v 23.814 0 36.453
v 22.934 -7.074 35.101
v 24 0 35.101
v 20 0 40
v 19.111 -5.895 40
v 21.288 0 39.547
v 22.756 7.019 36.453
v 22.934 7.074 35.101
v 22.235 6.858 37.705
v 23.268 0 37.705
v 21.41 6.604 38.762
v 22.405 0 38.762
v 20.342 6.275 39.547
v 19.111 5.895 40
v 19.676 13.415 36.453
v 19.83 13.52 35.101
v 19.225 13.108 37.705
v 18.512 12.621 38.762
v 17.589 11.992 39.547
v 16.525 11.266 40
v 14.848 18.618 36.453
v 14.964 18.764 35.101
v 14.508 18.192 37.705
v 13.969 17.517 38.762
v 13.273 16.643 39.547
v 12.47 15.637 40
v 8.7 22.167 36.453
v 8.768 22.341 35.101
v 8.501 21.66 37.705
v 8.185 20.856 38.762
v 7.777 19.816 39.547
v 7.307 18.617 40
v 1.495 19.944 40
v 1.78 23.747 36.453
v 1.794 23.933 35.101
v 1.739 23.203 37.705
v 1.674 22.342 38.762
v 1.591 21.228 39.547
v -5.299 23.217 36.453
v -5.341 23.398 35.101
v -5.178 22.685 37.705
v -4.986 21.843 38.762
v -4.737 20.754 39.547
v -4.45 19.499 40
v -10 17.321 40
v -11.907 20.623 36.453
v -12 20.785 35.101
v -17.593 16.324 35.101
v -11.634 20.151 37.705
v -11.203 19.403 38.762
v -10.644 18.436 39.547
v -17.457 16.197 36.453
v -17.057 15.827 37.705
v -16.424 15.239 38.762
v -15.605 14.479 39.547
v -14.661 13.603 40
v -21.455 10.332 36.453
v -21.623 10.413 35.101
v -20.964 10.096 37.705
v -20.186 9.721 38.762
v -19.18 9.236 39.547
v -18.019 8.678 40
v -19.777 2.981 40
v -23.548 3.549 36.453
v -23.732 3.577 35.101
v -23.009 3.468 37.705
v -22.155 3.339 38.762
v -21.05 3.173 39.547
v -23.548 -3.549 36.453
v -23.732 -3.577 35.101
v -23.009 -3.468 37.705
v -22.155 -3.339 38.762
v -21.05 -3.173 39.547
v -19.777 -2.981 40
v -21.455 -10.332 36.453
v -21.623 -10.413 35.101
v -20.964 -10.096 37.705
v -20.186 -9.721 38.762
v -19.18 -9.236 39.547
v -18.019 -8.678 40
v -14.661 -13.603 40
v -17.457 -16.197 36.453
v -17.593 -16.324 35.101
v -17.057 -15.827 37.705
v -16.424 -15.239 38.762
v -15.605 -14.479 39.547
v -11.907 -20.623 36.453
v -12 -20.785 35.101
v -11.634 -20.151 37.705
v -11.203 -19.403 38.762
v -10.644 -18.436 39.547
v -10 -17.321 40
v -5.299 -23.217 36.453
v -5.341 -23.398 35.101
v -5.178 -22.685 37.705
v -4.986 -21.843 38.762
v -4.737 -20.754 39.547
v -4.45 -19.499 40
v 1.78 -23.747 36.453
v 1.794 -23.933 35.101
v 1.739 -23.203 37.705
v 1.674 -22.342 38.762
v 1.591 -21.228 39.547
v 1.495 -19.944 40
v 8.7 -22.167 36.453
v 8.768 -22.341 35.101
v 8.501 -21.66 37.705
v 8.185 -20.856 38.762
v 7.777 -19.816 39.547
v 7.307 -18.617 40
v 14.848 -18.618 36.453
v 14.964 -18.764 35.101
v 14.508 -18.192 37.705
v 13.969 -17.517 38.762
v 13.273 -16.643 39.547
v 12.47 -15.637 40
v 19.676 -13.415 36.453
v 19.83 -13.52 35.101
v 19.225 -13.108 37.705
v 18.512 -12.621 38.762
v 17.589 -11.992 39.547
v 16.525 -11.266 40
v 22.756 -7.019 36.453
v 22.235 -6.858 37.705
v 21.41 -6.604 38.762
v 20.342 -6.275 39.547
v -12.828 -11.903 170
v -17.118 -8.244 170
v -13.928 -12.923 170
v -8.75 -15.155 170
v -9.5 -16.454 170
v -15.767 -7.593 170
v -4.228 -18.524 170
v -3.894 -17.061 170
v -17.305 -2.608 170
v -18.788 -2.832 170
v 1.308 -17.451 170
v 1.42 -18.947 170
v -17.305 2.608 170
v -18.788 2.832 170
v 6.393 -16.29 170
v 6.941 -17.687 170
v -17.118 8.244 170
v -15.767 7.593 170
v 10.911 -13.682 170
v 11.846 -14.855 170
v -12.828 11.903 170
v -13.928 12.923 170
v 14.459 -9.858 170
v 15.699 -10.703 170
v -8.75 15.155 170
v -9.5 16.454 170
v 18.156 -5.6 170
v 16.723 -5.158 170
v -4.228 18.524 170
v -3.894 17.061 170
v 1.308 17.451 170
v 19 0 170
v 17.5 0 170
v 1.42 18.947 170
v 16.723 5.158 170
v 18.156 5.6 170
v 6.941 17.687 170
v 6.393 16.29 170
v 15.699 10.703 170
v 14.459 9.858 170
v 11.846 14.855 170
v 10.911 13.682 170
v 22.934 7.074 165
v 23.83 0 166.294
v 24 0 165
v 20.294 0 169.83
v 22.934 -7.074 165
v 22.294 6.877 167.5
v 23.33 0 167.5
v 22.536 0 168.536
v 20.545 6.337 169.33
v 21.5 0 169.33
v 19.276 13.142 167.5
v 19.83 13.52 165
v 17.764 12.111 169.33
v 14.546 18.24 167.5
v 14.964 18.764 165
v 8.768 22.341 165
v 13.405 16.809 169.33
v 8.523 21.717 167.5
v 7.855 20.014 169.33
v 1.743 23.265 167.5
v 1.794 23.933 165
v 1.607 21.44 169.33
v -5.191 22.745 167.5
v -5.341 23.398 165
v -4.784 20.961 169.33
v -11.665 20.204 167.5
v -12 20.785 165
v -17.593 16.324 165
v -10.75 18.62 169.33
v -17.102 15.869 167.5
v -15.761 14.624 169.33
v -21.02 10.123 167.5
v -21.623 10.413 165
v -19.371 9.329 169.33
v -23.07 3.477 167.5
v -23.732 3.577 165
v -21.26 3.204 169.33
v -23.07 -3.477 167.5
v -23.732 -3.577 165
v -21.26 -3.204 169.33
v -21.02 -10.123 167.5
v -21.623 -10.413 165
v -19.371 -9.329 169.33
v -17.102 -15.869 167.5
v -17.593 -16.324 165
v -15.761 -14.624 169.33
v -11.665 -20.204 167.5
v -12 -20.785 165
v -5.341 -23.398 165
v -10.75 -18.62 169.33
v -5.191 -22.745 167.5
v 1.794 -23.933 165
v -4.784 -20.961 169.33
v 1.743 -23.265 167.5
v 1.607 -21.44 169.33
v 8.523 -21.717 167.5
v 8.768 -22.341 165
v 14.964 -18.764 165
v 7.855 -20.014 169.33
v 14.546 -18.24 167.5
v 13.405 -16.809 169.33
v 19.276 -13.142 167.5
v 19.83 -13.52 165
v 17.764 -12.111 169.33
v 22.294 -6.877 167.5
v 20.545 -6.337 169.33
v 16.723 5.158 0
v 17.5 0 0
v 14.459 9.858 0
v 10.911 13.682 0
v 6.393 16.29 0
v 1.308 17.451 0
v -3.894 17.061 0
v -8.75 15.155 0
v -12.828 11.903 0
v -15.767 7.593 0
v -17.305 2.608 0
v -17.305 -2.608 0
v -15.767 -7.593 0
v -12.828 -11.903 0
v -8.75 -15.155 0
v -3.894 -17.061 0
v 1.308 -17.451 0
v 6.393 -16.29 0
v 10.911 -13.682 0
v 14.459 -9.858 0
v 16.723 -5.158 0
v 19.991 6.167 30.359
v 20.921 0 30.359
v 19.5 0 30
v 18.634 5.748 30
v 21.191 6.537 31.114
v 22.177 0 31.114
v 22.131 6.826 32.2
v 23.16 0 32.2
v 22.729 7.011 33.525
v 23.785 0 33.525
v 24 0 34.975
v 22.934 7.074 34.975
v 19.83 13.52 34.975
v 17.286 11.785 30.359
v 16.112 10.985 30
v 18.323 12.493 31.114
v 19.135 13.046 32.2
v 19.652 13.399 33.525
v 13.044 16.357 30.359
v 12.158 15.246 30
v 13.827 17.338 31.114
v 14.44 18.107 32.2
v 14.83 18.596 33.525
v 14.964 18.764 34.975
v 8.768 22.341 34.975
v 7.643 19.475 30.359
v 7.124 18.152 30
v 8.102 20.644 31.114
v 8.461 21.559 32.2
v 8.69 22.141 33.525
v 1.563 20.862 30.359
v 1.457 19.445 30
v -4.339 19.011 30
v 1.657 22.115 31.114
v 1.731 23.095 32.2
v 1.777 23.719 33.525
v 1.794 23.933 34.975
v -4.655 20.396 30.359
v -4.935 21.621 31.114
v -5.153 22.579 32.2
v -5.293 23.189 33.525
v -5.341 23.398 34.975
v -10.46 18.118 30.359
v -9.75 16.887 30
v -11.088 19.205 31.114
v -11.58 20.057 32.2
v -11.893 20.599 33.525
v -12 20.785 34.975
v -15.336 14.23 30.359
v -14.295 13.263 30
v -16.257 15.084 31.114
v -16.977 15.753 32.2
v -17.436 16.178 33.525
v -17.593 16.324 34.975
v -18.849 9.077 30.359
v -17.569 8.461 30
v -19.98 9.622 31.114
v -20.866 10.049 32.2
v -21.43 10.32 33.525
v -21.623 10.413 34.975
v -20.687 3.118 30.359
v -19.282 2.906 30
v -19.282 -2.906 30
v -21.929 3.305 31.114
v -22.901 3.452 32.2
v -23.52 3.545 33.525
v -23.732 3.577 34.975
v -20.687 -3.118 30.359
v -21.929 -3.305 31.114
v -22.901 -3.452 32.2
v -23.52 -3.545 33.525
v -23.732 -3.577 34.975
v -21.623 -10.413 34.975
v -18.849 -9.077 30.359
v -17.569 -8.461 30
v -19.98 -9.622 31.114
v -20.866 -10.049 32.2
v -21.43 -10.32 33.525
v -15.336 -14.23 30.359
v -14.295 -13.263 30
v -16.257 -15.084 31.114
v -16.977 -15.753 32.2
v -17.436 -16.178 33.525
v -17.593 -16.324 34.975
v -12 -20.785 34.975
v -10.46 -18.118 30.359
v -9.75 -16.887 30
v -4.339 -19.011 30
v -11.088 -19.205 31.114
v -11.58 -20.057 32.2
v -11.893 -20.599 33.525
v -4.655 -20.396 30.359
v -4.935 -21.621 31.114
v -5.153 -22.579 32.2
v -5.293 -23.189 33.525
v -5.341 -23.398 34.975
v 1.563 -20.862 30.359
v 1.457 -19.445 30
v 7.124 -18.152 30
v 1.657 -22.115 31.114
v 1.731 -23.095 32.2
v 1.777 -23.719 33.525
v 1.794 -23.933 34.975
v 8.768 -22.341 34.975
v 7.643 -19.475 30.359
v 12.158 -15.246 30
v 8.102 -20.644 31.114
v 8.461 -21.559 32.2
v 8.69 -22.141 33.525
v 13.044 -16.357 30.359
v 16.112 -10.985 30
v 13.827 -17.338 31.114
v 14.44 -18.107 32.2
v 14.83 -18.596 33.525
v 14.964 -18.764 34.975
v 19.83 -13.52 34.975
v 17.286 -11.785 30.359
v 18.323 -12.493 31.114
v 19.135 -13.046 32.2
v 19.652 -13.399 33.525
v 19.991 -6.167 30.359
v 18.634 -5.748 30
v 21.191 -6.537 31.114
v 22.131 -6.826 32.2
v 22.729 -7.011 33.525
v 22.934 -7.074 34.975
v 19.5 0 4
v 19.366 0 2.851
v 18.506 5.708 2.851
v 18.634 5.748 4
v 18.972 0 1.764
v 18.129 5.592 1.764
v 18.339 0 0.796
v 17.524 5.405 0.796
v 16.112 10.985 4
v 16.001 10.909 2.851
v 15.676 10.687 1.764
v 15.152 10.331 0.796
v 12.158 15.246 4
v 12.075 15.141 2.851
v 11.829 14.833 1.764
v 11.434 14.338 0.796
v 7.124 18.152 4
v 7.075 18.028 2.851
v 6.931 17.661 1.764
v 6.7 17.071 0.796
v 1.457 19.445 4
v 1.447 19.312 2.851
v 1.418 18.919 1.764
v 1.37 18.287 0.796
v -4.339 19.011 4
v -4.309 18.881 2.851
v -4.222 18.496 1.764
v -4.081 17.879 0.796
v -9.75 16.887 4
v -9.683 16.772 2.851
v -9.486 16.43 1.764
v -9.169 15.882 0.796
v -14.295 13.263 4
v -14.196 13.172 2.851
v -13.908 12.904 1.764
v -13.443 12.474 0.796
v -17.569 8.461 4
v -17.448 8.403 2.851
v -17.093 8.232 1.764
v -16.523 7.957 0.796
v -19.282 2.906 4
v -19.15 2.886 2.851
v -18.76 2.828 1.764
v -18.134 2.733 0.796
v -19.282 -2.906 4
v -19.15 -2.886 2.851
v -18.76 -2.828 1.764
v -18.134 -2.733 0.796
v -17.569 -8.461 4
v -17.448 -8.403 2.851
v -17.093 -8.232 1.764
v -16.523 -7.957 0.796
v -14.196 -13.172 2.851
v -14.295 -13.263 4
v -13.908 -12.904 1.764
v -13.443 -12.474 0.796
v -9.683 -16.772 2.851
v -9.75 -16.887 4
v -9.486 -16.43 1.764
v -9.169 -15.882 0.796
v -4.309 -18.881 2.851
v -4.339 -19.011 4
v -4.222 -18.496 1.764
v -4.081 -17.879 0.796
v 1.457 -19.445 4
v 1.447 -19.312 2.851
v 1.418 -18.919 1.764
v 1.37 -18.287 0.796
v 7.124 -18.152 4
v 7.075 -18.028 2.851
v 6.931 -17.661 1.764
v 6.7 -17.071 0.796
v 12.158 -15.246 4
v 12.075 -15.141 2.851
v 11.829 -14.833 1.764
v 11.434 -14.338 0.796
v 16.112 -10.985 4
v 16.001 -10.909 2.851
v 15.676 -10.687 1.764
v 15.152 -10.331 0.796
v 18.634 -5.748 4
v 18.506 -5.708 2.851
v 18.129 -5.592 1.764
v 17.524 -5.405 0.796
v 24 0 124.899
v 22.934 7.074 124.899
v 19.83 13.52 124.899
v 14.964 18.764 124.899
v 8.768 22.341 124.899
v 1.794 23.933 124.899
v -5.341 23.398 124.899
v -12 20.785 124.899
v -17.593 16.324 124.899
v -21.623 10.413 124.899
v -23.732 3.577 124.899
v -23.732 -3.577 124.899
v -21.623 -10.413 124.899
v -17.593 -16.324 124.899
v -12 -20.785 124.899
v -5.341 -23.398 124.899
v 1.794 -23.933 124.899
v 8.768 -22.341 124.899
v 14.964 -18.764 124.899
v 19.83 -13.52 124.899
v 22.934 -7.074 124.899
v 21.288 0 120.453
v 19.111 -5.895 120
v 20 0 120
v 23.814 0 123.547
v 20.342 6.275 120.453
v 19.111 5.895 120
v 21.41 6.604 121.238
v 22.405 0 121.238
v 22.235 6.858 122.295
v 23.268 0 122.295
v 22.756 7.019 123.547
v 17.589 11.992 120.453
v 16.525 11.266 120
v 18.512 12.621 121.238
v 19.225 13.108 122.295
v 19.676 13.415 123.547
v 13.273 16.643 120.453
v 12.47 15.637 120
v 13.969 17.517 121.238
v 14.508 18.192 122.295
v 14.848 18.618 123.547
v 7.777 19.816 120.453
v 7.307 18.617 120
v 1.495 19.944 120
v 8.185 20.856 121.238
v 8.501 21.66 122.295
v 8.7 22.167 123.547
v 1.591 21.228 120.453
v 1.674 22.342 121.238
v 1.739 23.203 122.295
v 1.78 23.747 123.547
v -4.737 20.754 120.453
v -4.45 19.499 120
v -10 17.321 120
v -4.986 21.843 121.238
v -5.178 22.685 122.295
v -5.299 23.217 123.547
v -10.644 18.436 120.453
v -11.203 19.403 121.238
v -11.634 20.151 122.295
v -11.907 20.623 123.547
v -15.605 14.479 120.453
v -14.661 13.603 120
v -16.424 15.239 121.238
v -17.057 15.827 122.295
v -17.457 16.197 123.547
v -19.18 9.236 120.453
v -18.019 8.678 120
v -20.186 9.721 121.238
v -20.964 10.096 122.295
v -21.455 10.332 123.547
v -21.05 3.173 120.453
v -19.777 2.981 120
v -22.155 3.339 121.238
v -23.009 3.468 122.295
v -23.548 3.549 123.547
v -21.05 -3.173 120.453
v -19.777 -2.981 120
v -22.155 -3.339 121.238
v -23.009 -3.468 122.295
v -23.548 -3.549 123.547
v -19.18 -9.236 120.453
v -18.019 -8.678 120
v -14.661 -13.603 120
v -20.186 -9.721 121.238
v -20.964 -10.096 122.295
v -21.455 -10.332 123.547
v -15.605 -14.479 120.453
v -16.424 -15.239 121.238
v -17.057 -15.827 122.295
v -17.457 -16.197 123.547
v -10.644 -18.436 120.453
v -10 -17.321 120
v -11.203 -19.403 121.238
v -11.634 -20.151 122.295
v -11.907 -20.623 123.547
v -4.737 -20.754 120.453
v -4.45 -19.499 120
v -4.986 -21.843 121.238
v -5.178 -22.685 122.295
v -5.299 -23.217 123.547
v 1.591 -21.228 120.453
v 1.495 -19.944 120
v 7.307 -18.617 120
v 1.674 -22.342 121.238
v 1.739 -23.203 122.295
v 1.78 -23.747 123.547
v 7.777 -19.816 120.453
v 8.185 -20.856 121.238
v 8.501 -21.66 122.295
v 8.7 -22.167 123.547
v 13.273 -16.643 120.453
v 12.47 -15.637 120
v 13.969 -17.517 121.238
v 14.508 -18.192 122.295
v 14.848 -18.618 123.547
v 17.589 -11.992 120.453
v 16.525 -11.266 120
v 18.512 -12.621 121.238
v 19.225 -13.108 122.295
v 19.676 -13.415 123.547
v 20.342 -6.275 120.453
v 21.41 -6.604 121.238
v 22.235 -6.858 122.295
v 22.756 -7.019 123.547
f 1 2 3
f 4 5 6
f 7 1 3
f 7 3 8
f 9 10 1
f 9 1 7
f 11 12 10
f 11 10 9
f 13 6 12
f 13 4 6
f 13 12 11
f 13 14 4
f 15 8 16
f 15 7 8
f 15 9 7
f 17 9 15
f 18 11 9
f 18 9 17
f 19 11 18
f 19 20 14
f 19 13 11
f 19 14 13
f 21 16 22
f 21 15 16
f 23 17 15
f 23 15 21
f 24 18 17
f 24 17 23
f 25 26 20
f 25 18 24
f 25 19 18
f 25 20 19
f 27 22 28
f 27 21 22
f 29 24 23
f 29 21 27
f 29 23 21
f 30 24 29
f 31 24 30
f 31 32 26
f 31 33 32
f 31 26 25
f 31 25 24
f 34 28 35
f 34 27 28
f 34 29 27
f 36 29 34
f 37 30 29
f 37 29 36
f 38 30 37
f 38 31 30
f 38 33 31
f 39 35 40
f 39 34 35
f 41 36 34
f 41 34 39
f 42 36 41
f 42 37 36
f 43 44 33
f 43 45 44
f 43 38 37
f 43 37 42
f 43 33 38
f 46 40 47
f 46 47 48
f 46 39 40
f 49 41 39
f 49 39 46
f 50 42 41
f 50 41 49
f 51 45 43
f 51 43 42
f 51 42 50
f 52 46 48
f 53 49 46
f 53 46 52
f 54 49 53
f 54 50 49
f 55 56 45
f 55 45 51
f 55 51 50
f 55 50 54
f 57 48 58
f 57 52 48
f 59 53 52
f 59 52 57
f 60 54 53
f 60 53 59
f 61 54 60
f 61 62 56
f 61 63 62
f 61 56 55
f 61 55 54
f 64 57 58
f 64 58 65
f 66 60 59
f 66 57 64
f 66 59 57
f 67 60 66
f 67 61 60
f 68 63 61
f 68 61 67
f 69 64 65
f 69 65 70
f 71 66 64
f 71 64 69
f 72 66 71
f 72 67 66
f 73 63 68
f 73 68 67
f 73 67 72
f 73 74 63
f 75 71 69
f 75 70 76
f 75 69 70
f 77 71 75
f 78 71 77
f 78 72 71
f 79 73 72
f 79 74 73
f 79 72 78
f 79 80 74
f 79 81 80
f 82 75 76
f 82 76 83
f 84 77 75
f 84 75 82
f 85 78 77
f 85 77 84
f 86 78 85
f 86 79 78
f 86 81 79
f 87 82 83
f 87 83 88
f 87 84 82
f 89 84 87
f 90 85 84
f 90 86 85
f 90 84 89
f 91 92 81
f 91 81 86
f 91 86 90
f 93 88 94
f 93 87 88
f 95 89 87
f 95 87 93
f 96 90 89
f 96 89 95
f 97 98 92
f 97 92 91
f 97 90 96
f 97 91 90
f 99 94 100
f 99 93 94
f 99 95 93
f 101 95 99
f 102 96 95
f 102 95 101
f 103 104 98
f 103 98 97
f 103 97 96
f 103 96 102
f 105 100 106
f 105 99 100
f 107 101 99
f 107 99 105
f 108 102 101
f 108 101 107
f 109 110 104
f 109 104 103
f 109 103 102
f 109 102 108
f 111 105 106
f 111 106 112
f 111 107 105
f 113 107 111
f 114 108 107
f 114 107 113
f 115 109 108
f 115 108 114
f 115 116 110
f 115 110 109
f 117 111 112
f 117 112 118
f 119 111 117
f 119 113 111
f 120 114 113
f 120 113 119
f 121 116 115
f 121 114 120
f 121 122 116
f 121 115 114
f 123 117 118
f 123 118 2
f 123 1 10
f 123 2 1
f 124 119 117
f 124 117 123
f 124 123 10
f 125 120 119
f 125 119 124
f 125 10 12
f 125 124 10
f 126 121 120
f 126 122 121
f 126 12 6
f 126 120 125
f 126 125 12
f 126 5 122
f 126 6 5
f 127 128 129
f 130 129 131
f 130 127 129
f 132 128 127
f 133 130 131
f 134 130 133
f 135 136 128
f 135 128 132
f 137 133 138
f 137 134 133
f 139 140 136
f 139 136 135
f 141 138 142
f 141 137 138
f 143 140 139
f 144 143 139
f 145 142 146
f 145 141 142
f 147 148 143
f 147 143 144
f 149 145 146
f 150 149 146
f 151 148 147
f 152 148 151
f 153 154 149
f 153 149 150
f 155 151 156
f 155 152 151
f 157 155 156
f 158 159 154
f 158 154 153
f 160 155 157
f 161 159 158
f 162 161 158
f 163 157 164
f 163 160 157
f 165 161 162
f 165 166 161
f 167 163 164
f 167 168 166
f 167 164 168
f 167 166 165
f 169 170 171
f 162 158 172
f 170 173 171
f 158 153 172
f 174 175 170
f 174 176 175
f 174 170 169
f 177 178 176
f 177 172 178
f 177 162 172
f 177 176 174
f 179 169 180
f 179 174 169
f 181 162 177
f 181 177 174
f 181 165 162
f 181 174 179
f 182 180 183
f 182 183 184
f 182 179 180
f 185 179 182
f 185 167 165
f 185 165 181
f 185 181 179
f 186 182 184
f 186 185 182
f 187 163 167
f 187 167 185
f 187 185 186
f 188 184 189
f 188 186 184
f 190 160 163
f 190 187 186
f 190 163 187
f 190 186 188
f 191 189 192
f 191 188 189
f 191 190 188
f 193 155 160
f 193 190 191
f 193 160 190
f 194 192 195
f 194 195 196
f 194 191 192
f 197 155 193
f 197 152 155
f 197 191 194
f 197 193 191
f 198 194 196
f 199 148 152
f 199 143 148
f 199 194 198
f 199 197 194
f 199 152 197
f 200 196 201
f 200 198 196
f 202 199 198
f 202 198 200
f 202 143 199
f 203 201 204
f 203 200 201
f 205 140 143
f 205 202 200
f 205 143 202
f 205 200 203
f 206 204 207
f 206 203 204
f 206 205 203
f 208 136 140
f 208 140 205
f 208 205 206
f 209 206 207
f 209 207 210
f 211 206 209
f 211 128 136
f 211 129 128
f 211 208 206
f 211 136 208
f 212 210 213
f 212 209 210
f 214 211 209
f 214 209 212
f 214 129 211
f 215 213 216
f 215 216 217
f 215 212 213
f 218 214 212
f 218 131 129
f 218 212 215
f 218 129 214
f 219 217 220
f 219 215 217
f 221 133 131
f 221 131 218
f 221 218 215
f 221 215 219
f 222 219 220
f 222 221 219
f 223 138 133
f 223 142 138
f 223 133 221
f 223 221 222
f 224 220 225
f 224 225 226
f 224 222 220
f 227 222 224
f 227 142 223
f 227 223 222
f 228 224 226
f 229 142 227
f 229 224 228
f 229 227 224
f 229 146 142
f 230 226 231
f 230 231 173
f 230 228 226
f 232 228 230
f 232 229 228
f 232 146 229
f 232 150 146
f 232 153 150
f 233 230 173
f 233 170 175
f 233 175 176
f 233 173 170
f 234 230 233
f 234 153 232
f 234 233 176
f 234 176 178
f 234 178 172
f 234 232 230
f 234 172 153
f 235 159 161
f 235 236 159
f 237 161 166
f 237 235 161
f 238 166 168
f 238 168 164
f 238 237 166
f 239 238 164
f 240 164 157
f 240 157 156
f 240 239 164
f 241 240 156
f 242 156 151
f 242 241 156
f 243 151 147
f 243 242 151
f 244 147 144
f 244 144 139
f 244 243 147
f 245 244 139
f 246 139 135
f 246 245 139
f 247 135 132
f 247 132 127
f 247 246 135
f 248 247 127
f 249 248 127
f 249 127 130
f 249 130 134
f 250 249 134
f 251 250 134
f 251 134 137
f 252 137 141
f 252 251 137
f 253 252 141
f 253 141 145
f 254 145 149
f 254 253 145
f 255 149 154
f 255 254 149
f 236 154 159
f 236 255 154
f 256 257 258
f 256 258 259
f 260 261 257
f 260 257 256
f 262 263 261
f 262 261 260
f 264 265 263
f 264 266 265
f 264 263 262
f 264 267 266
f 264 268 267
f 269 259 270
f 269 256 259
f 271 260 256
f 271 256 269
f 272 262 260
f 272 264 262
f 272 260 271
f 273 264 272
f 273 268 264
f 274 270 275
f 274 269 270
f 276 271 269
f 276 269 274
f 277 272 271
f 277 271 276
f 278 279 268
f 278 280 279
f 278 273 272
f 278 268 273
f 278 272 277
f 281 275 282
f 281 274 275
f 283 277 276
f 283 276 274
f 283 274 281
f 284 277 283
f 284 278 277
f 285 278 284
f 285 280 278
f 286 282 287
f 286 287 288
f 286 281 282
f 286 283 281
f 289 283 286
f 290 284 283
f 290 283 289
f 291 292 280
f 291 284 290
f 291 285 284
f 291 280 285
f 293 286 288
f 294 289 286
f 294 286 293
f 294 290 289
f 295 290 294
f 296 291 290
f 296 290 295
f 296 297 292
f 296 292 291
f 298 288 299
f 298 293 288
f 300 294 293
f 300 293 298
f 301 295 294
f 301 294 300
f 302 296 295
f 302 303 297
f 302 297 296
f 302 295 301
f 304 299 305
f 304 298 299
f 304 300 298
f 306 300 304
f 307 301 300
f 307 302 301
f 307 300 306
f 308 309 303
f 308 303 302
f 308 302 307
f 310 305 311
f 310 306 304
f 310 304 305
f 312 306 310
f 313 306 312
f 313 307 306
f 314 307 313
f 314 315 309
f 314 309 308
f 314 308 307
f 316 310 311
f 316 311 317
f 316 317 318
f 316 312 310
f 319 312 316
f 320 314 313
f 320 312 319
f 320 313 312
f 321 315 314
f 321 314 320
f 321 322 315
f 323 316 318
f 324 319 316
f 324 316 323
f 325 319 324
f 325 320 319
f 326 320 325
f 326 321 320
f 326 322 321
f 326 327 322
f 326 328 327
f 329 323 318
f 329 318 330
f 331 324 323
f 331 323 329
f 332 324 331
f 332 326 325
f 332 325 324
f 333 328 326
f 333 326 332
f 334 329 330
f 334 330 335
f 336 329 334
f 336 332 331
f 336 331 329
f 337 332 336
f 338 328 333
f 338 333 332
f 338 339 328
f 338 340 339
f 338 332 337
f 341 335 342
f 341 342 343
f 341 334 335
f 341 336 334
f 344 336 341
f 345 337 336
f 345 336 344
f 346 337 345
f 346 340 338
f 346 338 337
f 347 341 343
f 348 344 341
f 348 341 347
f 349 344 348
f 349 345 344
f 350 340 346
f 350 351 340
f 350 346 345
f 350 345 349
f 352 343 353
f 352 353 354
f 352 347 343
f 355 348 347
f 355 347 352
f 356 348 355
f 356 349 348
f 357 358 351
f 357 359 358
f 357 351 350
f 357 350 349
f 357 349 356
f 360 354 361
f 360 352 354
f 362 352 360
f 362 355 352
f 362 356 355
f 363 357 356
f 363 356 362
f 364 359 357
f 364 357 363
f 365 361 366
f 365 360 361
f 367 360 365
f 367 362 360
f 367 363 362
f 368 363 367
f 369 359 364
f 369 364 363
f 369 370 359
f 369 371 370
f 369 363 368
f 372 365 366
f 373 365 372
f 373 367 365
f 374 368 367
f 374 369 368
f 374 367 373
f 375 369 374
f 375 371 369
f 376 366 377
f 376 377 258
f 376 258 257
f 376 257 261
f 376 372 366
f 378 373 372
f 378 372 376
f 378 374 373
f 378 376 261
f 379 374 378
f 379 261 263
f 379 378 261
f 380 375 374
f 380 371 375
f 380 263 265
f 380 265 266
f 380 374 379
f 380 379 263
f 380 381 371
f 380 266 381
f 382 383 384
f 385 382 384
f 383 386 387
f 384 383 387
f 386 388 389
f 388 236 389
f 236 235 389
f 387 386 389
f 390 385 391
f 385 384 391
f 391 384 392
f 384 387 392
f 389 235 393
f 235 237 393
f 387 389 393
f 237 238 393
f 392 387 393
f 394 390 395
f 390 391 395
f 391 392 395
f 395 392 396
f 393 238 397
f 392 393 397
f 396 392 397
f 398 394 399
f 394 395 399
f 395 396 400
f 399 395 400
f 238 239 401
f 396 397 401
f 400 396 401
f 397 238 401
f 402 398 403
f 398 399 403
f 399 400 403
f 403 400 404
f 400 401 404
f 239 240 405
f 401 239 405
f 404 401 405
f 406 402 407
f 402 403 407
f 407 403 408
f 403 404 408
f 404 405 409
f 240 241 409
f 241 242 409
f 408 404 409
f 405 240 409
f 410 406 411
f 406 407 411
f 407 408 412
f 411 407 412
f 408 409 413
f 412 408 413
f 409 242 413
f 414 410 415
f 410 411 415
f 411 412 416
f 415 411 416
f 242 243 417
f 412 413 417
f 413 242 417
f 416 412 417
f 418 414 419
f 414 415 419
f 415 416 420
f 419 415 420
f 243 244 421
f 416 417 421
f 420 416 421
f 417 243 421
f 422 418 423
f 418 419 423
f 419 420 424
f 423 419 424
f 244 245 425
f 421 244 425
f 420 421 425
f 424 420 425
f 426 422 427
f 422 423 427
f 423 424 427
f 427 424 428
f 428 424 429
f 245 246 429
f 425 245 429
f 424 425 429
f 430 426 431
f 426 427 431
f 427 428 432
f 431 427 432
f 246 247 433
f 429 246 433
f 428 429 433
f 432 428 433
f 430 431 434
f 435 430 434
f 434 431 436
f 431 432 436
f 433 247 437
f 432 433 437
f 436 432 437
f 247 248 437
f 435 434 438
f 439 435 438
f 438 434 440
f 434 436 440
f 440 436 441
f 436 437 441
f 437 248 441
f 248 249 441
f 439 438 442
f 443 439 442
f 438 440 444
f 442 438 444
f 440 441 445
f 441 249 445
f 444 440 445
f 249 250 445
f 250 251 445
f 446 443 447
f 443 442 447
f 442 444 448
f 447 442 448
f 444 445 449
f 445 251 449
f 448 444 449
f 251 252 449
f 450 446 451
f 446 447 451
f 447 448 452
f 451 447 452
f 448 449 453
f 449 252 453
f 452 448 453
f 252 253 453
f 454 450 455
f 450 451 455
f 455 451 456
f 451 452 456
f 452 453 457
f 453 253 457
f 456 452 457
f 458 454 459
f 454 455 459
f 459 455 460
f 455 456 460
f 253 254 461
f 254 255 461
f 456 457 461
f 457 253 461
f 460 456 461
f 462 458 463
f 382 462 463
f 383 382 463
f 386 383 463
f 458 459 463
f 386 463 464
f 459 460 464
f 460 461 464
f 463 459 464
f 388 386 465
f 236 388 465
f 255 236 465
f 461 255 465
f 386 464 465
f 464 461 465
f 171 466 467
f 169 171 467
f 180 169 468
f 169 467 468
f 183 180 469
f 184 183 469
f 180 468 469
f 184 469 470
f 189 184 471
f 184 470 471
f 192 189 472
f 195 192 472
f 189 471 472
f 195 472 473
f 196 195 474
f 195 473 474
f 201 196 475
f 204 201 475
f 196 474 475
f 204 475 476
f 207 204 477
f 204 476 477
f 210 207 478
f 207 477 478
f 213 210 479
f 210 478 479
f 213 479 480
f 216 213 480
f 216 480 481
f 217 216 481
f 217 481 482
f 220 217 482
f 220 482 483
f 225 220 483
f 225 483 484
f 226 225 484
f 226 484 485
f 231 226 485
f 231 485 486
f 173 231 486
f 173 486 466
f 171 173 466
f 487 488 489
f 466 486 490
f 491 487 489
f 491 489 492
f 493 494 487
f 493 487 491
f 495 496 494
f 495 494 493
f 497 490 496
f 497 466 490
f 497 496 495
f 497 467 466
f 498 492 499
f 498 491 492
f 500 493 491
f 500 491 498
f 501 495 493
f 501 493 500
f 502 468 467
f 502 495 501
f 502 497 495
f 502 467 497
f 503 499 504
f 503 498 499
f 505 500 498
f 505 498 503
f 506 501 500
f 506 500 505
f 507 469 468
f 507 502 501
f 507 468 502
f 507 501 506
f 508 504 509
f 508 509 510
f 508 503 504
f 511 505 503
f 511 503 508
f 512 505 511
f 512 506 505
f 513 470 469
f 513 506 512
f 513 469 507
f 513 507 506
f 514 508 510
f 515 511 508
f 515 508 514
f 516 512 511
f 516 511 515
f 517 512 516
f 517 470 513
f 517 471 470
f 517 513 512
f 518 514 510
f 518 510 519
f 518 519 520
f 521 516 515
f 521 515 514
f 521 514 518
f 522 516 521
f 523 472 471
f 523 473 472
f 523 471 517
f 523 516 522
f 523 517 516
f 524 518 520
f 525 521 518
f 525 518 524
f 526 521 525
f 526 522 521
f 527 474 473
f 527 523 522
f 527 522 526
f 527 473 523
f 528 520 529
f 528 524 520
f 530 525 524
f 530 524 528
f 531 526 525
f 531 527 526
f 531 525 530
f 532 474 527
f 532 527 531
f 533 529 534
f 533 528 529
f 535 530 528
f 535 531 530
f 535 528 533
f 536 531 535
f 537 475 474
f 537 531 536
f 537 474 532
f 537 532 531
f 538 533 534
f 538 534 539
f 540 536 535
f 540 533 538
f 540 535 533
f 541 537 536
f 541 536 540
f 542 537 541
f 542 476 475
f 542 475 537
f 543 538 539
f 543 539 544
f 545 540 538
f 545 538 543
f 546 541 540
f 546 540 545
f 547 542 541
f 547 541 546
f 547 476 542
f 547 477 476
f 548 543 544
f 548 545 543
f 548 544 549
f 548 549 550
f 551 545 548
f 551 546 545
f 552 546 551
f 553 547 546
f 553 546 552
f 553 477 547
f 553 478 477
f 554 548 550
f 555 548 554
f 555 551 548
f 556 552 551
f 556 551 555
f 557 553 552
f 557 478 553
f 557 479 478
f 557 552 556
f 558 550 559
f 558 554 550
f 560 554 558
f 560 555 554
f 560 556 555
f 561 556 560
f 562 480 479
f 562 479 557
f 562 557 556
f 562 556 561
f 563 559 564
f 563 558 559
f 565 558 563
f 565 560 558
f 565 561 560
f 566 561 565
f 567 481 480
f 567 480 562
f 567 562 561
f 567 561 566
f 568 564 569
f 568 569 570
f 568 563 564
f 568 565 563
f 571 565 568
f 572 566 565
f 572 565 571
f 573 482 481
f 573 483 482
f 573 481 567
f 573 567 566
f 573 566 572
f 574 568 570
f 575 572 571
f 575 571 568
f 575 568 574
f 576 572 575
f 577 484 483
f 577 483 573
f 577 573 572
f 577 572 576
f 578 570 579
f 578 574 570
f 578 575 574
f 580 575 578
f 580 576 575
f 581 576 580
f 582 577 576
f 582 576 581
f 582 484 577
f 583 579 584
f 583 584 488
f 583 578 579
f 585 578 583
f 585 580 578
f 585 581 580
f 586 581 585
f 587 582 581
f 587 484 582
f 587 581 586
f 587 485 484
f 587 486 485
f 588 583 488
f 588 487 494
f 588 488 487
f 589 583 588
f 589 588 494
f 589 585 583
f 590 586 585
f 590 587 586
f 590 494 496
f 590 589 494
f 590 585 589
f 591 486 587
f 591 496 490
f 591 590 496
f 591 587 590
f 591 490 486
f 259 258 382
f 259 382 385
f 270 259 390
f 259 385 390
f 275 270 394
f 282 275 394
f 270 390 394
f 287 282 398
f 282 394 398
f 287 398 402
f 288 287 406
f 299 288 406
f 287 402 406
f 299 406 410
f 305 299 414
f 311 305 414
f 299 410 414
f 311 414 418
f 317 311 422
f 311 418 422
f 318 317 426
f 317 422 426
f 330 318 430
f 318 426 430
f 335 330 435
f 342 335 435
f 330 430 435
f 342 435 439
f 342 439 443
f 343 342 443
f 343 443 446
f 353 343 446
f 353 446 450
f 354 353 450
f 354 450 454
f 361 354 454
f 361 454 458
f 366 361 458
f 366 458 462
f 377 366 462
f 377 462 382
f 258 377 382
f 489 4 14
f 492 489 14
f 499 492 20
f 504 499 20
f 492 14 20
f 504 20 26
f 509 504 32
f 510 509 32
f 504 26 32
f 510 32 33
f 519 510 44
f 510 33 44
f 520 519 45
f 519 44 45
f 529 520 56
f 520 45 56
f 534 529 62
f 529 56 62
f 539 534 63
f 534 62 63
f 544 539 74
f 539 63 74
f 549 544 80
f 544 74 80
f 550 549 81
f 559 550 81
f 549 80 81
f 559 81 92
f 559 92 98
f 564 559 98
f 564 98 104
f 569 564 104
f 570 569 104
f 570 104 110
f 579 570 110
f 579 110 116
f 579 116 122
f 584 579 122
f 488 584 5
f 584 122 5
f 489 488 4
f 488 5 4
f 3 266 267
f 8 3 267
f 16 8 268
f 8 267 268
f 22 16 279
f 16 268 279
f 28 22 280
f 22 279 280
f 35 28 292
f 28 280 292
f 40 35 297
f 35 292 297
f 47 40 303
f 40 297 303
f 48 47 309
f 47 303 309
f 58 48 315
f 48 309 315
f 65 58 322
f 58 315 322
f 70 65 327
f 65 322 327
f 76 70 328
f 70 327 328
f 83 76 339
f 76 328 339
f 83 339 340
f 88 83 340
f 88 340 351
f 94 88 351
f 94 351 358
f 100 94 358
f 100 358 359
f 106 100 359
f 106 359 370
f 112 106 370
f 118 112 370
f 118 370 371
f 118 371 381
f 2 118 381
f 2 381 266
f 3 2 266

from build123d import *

# Parameters (mm, degrees)
F0_R     = 19.5
F0_R_2   = 17.5
F1_DEPTH = 30
F2_R     = 24
F2_R_2   = 19.5
F2_R_3   = 17.5
F3_DEPTH = 10
F4_R     = 20
F4_R_2   = 17.5
F5_DEPTH = 80
F6_R     = 24
F6_R_2   = 17.5
F7_DEPTH = 50


# Not quite as in the source:
# - a fillet or chamfer that OpenCascade refuses, or shapes differently, is made with other operations: its cross-section is extruded or revolved along the edge and cut away or added


with BuildPart() as f1:
    # F0 (on Top) → F1 (new body)
    with BuildSketch(Plane.XY):
        Circle(F0_R)
        Circle(F0_R_2, mode=Mode.SUBTRACT)
    extrude(amount=F1_DEPTH)

    # F2 (on face) → F3 (join)
    with BuildSketch(Plane.XY.offset(30)):
        Circle(F2_R)
        Circle(F2_R_2, mode=Mode.SUBTRACT)
        Circle(F2_R_2)
        Circle(F2_R_3, mode=Mode.SUBTRACT)
    extrude(amount=F3_DEPTH)

    # F4 (on face) → F5 (join)
    with BuildSketch(Plane.XY.offset(40)):
        Circle(F4_R)
        Circle(F4_R_2, mode=Mode.SUBTRACT)
    extrude(amount=F5_DEPTH)

    # F6 (on face) → F7 (join)
    with BuildSketch(Plane.XY.offset(120)):
        Circle(F6_R)
        Circle(F6_R_2, mode=Mode.SUBTRACT)
    extrude(amount=F7_DEPTH)

    # F8: fillet of radius 5 on 5 edges, made by hand

    # F8_s1 → F8_t2 (revolve, cut)
    with BuildSketch(Plane.XZ):
        with BuildLine():
            ThreePointArc((24, 165), (22.5355339059, 168.5355339059), (19, 170))
            Line((19, 170), (24, 170))
            Line((24, 170), (24, 165))
        make_face()
    revolve(axis=Axis((0, 0, 170), (0, 0, 1)), mode=Mode.SUBTRACT)

    # F8_s3 → F8_t4 (revolve, cut)
    with BuildSketch(Plane.XZ):
        with BuildLine():
            ThreePointArc((20, 120), (22.8729833462, 121.7367018254), (24, 124.8989794856))
            Line((24, 124.8989794856), (24, 120))
            Line((24, 120), (20, 120))
        make_face()
    revolve(axis=Axis((0, 0, 120), (0, 0, 1)), mode=Mode.SUBTRACT)

    # F8_s5 → F8_t6 (revolve, cut)
    with BuildSketch(Plane.XZ):
        with BuildLine():
            ThreePointArc((24, 35.1010205144), (22.8729833462, 38.2632981746), (20, 40))
            Line((20, 40), (24, 40))
            Line((24, 40), (24, 35.1010205144))
        make_face()
    revolve(axis=Axis((0, 0, 40), (0, 0, 1)), mode=Mode.SUBTRACT)

    # F8_s7 → F8_t8 (revolve, cut)
    with BuildSketch(Plane.XZ):
        with BuildLine():
            ThreePointArc((19.5, 30), (22.7080992435, 31.6208352193), (24, 34.9749371855))
            Line((24, 34.9749371855), (24, 30))
            Line((24, 30), (19.5, 30))
        make_face()
    revolve(axis=Axis((0, 0, 30), (0, 0, 1)), mode=Mode.SUBTRACT)

    # F8_s9 → F8_t10 (revolve, cut)
    with BuildSketch(Plane.XZ):
        with BuildLine():
            ThreePointArc((19.5, 4), (18.972135955, 1.7639320225), (17.5, 0))
            Line((17.5, 0), (19.5, 0))
            Line((19.5, 0), (19.5, 4))
        make_face()
    revolve(axis=Axis((0, 0, 0), (0, 0, 1)), mode=Mode.SUBTRACT)


solid = f1.part
